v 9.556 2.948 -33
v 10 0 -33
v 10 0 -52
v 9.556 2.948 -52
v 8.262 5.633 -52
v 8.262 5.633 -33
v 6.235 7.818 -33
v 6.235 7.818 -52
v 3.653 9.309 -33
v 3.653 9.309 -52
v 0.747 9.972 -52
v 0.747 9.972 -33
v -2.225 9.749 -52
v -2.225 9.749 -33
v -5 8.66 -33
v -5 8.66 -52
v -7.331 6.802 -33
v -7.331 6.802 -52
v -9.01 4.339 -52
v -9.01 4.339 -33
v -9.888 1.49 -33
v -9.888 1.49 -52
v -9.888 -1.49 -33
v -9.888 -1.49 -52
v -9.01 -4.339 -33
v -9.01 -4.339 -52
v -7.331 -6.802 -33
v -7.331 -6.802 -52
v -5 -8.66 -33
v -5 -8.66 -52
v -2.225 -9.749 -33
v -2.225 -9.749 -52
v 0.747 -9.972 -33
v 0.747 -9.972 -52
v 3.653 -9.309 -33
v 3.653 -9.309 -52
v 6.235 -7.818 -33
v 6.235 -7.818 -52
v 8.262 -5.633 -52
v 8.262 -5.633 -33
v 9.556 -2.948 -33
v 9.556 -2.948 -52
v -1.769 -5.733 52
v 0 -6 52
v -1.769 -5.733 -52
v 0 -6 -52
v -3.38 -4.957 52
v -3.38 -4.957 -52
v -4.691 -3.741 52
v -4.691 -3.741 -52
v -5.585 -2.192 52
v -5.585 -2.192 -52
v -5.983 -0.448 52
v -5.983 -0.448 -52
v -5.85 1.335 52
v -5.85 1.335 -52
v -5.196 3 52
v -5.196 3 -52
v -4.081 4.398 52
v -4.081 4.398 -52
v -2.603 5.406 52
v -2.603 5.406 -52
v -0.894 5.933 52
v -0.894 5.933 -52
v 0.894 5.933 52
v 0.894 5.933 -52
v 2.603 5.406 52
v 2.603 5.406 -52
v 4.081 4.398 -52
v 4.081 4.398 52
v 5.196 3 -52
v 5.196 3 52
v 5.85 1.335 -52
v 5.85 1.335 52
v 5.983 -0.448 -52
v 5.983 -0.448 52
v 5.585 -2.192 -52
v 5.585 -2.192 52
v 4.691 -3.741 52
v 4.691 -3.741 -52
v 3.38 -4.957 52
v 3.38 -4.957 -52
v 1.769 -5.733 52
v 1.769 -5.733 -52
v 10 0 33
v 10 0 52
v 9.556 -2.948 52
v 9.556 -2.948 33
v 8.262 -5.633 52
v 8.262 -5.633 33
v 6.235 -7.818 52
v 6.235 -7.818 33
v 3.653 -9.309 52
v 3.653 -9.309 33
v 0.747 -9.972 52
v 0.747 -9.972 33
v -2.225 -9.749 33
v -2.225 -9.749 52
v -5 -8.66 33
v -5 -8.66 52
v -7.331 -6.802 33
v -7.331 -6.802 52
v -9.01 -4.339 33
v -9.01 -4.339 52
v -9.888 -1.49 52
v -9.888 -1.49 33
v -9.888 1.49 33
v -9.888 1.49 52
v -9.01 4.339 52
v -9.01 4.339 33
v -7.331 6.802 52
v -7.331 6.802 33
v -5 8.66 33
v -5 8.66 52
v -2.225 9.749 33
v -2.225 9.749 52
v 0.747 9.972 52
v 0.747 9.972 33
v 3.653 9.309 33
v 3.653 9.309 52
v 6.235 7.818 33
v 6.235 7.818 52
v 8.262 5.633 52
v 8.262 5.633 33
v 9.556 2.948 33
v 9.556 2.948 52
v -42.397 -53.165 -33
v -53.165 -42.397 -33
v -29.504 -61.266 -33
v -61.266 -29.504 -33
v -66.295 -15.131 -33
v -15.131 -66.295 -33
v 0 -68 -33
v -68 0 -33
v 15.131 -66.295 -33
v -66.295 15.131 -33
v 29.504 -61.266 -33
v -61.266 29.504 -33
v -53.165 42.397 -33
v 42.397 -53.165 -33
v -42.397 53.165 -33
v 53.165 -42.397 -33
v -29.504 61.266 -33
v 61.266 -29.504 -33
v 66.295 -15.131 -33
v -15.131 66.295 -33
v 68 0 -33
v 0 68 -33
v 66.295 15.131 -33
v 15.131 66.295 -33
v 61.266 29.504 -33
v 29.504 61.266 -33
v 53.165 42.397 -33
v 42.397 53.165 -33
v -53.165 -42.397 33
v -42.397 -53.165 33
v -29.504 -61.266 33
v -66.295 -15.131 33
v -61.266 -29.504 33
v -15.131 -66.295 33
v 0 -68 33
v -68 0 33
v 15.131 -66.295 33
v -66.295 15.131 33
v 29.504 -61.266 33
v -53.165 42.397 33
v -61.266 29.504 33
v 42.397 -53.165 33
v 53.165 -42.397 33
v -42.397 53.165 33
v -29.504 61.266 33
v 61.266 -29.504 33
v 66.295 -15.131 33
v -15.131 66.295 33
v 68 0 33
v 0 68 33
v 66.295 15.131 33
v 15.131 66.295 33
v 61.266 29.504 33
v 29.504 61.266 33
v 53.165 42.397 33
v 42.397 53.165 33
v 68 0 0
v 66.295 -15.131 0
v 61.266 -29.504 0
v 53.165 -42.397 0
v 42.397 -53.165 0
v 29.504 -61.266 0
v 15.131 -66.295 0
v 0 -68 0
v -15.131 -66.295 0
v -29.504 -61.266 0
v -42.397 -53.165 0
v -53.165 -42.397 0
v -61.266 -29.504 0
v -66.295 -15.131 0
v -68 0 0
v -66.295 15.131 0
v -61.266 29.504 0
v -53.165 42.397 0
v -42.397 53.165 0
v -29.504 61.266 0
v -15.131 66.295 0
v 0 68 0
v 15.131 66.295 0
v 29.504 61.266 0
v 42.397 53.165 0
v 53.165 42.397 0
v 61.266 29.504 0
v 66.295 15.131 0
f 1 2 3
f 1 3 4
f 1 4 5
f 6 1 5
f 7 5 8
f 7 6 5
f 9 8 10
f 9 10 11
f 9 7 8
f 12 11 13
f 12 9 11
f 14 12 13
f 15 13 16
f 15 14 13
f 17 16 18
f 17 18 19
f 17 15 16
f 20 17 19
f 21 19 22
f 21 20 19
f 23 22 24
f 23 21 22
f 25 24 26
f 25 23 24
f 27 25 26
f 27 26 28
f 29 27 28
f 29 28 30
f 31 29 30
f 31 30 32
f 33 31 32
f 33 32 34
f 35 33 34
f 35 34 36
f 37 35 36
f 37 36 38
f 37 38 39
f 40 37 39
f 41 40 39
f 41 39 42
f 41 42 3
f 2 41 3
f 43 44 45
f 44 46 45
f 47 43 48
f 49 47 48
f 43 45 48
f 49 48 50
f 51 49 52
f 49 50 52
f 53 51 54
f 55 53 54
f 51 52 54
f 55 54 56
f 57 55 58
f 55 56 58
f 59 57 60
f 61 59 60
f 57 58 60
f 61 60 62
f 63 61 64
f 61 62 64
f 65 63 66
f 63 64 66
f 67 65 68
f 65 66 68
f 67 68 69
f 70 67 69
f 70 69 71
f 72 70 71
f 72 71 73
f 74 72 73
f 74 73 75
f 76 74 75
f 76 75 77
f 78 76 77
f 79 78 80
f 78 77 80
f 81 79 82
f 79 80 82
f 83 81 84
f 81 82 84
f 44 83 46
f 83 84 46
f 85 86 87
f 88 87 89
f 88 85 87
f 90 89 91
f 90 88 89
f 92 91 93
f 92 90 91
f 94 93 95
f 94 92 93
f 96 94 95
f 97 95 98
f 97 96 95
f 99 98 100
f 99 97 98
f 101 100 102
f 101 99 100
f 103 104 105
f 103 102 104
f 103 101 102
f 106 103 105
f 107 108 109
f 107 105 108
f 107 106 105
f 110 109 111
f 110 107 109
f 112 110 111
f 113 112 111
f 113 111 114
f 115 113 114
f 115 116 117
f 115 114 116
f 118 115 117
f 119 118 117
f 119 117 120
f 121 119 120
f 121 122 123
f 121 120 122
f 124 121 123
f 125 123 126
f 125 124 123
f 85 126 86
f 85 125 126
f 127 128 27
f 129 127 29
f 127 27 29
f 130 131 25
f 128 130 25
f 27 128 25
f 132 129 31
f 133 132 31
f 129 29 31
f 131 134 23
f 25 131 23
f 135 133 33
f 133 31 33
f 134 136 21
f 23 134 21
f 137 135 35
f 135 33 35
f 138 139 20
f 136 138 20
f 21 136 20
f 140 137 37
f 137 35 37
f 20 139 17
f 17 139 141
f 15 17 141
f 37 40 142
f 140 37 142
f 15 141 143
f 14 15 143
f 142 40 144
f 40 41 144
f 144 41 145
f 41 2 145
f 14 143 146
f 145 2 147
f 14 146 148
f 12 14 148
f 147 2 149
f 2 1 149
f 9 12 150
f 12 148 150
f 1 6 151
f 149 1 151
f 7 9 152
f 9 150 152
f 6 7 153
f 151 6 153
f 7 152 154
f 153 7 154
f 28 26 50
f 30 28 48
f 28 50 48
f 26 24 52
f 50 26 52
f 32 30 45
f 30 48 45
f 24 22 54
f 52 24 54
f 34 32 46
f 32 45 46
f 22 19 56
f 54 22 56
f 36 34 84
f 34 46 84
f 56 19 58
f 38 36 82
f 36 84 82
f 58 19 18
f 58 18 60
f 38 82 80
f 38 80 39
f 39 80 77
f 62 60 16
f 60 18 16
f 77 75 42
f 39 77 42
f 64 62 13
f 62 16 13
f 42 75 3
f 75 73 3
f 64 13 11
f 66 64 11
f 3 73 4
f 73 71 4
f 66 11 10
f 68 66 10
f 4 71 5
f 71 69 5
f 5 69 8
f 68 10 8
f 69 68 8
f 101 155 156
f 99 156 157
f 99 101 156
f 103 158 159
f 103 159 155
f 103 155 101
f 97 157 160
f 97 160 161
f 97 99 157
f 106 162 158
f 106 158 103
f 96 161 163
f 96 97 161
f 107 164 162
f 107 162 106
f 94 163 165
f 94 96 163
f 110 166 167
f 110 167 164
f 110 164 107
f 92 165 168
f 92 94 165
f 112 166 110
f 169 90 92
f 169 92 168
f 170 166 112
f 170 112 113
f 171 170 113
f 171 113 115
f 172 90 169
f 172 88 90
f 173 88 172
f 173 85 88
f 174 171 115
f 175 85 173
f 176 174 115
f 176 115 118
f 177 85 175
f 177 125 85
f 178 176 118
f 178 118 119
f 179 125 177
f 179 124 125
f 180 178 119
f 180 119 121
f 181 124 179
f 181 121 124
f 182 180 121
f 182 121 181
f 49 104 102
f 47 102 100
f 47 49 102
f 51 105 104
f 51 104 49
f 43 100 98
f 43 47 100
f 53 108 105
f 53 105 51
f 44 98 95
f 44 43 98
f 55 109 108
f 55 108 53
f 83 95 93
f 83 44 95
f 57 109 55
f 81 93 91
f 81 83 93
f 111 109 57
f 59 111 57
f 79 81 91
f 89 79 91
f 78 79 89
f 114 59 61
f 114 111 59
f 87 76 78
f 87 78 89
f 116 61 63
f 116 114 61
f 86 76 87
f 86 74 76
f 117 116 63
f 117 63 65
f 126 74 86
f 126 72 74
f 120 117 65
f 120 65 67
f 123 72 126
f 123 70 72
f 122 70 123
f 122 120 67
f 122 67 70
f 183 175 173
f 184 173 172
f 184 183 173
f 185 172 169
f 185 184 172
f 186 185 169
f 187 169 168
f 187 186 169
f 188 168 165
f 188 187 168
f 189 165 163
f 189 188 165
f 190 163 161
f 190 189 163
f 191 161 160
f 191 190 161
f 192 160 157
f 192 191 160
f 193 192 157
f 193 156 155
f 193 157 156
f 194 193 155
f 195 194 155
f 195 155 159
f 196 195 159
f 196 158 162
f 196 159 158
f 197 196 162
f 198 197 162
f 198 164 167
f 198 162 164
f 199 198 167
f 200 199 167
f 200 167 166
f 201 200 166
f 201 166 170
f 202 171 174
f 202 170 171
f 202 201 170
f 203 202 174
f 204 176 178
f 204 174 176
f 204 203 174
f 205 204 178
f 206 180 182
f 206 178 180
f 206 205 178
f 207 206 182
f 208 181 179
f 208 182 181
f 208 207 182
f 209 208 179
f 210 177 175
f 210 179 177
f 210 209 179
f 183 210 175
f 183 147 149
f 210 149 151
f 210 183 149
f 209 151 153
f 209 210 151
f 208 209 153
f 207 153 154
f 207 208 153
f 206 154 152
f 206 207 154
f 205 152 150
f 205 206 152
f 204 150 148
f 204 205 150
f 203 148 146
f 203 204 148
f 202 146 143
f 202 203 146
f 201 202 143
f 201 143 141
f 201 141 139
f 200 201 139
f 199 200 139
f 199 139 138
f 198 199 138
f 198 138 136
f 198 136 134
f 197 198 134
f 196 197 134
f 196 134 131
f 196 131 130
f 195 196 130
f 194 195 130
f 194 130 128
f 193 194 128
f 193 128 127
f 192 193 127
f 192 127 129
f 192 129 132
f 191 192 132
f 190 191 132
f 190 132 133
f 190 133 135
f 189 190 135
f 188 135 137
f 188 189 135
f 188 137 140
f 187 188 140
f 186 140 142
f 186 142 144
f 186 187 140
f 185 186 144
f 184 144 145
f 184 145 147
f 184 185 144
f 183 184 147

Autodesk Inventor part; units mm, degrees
ref_plane "YZ Plane" through (0, 0, 0) normal (1, 0, 0) x (0, 1, 0)
ref_plane "XZ Plane" through (0, 0, 0) normal (0, 1, 0) x (-1, 0, 0)
ref_plane "XY Plane" through (0, 0, 0) normal (0, 0, 1) x (1, 0, 0)
sketch "スケッチ1" plane through (0, 0, 0) normal (0, 0, 1) x (1, 0, 0)
  circle A0 centre (0, 0) radius 68
  dimension "d0" = 136
extrude "押し出し1" add sketch "スケッチ1" along normal mid plane 66
sketch "スケッチ2" plane through (0, 0, 0) normal (0, 0, 1) x (1, 0, 0)
  circle A0 centre (0, 0) radius 10
  dimension "d3" = 20
extrude "押し出し2" add sketch "スケッチ2" along normal mid plane 104
sketch "スケッチ3" plane through (0, 0, 52) normal (0, 0, 1) x (1, 0, 0)
  point P0 (0, 0)
  point P1 (0, 0)
hole "穴1" at (0, 0, 52) direction (0, 0, -1) diameter 12 end through all
properties part number "前輪ハブ"
